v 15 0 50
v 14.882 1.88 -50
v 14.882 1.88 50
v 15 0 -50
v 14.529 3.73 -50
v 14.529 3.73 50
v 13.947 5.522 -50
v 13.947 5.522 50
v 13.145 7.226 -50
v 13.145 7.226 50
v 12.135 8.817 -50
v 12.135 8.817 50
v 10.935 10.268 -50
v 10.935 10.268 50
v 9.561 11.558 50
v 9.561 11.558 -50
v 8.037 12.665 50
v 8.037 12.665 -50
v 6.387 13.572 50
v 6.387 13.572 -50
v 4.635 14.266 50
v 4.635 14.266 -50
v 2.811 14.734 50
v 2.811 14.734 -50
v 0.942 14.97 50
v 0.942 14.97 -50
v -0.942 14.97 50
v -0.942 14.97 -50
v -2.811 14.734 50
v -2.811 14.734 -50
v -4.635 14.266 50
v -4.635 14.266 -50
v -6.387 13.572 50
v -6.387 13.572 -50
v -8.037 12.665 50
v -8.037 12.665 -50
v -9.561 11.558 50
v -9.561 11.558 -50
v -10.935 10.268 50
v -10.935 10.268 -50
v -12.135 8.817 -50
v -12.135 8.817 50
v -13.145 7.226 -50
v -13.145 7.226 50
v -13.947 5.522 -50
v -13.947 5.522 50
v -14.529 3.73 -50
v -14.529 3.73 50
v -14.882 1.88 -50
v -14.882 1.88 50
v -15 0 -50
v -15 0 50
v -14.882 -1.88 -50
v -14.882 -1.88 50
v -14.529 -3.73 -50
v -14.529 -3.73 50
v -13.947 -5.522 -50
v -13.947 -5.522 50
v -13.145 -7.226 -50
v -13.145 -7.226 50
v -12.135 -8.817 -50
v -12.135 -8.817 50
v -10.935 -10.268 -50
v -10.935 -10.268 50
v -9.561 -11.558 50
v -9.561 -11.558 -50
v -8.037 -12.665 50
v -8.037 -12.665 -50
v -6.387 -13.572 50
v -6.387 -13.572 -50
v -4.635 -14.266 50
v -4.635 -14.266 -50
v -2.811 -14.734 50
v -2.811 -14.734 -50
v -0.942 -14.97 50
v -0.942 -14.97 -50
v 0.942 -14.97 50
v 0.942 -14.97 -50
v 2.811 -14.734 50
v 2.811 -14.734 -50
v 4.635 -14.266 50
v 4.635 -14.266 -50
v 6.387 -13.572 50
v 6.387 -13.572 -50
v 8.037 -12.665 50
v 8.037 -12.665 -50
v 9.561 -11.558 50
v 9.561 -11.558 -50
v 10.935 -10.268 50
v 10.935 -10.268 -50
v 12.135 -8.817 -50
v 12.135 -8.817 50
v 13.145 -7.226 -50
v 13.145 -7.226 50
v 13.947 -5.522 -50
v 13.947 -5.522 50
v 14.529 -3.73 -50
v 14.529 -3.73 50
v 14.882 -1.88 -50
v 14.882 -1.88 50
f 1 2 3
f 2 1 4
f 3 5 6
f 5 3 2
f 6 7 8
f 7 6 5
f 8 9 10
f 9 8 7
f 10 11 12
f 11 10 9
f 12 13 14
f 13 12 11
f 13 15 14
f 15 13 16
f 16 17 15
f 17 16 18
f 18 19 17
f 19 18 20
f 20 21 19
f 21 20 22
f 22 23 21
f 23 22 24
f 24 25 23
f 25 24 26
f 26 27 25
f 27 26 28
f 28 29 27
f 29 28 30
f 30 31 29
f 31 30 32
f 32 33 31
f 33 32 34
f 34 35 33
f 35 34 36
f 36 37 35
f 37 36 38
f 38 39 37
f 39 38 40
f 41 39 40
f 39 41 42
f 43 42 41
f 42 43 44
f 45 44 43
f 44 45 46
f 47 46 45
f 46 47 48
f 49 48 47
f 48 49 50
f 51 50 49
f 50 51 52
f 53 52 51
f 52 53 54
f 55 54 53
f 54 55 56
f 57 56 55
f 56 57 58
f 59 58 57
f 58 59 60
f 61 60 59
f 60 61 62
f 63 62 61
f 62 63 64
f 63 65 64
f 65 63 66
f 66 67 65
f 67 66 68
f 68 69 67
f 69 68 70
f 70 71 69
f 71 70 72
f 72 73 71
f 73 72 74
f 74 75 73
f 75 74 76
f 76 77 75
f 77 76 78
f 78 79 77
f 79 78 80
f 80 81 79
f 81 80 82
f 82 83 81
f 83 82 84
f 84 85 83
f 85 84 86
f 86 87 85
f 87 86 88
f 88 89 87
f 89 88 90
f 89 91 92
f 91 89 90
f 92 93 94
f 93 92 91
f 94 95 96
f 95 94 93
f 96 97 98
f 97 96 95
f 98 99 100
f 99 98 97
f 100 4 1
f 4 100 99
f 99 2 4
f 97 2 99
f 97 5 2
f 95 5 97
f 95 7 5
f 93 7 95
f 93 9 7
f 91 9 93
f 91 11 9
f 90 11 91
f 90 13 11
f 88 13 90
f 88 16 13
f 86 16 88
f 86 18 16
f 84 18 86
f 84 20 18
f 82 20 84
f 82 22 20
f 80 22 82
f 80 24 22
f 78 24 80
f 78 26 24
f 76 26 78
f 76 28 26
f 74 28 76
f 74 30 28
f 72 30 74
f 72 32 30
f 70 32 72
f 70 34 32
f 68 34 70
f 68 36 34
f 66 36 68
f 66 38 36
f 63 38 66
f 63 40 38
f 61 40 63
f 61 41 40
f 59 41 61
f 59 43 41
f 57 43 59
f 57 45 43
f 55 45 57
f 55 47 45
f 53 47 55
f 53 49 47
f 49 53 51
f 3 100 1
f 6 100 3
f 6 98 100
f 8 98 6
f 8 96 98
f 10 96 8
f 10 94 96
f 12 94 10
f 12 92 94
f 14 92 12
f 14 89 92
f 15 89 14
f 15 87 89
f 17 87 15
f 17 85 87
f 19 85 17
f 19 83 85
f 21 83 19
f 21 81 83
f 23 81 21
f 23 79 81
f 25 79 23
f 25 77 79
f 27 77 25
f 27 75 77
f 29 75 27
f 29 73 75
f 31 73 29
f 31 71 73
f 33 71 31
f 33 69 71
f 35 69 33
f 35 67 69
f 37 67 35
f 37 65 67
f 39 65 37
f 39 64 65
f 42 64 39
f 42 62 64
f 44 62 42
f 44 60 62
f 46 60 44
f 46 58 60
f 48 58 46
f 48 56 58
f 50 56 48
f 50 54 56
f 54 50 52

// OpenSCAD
// file: ../config/parameters.scad
// Global Chassis Dimensions
chassis_width = 720; //kies een veelvoud van 80  
chassis_length = 1040; //kies een veelvoud van 80

// --- Modulair Gatenpatroon (Grid) ---
grid_step = 40; // Universele stapgrootte voor alle gaten

// --- Bereiken (Ranges) voor de Robot Afmetingen ---
// Bereik voor de BREEDTE 
chassis_width_min = 560;
chassis_width_max = 800;
chassis_width_step = 80; // Stapgrootte voor instelbare breedte

// Bereik voor de LENGTE 
chassis_length_min = 720;
chassis_length_max = 1040;
chassis_length_step = 80; // Stapgrootte voor instelbare lengte

// Bereik voor de BASE PLATE 
base_length_min = 800;
base_length_max = 1280;
base_length_step = 80;

// Beam Profile (Purchased Part)
beam_profile = 40;
beam_thickness = 3;    
beam_length_1 = 1000;
beam_length_2 = 1280;

// Upright & Cover
base_plate_length = 1300;
connect_plate_thick = 5; 
upright_height = 500;
top_side_width = 60;
cover_thick = 5;
cover_clearance = 10;  
cover_overlap = 10;
cover_total_height = 530; 
hole_distance_cover = 30;

// Resolution & Preview
$fn = 60; 
exploded_view = false; 
explosion_dist = 800; 

// Motor & Wheel Data
tire_dia = 430;
tire_width = 100;
hub_dia = 160;
hub_width = 140; //specs from Quinder are: Fork width for mounting: 138mm
axle_dia = 10.2; //specs from Quinder are: Mounting hole: max 10.2mm
bolt_dia = 14.2;

// Bracket Geometry universal
bracket_thick = 5;
bracket_bolt_diameter = 10.4; //dikte van de gaten van gaten van de wiel_bracket     
tire_clearance = 130;      
side_plate_top_width = 240;
side_plate_width = 240;

//Side plate
axle_bottom_dist = 35;
extra_space_bracket = 40;
side_hole_start_from_bottom = 20; 
side_hole_pitch = 100; 

tab_length = 40;         // Lengte van de nok/sleuf
tab_offset_y = 40;       // Positie vanaf het midden over de Y-as (uit elkaar)
laser_tolerance = 0.5;   // Extra snijspeling zodat het makkelijk in elkaar schuift

//top plate
bracket_top_hole_dist_x = 80; // De totale gewenste afstand over de X-as
bracket_top_hole_dist_y = 120; // De totale gewenste afstand over de Y-as


arm_height = (tire_dia / 2) + tire_clearance;
inner_width = hub_width;
bracket_total_width = inner_width + (extra_space_bracket*2) + (2 * bracket_thick);
bracket_top_z = arm_height + bracket_thick;

// Axle bracket
axle_hex_width = 85;          
axle_hex_height = 40;
axle_hex_straight_part = 30;   
axle_bracket_thickness = 5;    

axle_hole_diameter = 10.3; //Dikte van het gaten in de axle_bracket
axle_hole_distance = 30; //hoogte vanaf de onderkant tot de wiel ophanging

axle_flat_width = axle_dia; // Gebruikt 10.2 uit parameters 
axle_round_dia = bolt_dia;  // Gebruikt 14.2 uit parameters

// --- Caster Wheel Parameters ---  
bracket_width            = 80;  
bracket_thickness        = 5;
caster_wheel_axle_width  = 130;   
caster_wheel_axle_diameter = 20;
bracket_axle_hole_diameter = 10.4;

pivot_cylinder_dia       = 30;  
pivot_cylinder_height    = 100;  

outer_cylinder_thickness = 5;   
outer_cylinder_height    = 60;  
outer_cylinder_z_offset  = 33;   
kap_speling              = 1;   

tube_width               = 35;  
tube_thickness           = 2;   
tube_length              = 400;
tube_length_min          = 240;
// main file
include <../config/parameters.scad>

module caster_wheel_pivot_cilinder() {
    color("grey") {
        cylinder(h=pivot_cylinder_height, d=pivot_cylinder_dia, center=true, $fn=50);
    }
}

// Test render (verwijder of comment uit bij gebruik in assembly)
caster_wheel_pivot_cilinder();
